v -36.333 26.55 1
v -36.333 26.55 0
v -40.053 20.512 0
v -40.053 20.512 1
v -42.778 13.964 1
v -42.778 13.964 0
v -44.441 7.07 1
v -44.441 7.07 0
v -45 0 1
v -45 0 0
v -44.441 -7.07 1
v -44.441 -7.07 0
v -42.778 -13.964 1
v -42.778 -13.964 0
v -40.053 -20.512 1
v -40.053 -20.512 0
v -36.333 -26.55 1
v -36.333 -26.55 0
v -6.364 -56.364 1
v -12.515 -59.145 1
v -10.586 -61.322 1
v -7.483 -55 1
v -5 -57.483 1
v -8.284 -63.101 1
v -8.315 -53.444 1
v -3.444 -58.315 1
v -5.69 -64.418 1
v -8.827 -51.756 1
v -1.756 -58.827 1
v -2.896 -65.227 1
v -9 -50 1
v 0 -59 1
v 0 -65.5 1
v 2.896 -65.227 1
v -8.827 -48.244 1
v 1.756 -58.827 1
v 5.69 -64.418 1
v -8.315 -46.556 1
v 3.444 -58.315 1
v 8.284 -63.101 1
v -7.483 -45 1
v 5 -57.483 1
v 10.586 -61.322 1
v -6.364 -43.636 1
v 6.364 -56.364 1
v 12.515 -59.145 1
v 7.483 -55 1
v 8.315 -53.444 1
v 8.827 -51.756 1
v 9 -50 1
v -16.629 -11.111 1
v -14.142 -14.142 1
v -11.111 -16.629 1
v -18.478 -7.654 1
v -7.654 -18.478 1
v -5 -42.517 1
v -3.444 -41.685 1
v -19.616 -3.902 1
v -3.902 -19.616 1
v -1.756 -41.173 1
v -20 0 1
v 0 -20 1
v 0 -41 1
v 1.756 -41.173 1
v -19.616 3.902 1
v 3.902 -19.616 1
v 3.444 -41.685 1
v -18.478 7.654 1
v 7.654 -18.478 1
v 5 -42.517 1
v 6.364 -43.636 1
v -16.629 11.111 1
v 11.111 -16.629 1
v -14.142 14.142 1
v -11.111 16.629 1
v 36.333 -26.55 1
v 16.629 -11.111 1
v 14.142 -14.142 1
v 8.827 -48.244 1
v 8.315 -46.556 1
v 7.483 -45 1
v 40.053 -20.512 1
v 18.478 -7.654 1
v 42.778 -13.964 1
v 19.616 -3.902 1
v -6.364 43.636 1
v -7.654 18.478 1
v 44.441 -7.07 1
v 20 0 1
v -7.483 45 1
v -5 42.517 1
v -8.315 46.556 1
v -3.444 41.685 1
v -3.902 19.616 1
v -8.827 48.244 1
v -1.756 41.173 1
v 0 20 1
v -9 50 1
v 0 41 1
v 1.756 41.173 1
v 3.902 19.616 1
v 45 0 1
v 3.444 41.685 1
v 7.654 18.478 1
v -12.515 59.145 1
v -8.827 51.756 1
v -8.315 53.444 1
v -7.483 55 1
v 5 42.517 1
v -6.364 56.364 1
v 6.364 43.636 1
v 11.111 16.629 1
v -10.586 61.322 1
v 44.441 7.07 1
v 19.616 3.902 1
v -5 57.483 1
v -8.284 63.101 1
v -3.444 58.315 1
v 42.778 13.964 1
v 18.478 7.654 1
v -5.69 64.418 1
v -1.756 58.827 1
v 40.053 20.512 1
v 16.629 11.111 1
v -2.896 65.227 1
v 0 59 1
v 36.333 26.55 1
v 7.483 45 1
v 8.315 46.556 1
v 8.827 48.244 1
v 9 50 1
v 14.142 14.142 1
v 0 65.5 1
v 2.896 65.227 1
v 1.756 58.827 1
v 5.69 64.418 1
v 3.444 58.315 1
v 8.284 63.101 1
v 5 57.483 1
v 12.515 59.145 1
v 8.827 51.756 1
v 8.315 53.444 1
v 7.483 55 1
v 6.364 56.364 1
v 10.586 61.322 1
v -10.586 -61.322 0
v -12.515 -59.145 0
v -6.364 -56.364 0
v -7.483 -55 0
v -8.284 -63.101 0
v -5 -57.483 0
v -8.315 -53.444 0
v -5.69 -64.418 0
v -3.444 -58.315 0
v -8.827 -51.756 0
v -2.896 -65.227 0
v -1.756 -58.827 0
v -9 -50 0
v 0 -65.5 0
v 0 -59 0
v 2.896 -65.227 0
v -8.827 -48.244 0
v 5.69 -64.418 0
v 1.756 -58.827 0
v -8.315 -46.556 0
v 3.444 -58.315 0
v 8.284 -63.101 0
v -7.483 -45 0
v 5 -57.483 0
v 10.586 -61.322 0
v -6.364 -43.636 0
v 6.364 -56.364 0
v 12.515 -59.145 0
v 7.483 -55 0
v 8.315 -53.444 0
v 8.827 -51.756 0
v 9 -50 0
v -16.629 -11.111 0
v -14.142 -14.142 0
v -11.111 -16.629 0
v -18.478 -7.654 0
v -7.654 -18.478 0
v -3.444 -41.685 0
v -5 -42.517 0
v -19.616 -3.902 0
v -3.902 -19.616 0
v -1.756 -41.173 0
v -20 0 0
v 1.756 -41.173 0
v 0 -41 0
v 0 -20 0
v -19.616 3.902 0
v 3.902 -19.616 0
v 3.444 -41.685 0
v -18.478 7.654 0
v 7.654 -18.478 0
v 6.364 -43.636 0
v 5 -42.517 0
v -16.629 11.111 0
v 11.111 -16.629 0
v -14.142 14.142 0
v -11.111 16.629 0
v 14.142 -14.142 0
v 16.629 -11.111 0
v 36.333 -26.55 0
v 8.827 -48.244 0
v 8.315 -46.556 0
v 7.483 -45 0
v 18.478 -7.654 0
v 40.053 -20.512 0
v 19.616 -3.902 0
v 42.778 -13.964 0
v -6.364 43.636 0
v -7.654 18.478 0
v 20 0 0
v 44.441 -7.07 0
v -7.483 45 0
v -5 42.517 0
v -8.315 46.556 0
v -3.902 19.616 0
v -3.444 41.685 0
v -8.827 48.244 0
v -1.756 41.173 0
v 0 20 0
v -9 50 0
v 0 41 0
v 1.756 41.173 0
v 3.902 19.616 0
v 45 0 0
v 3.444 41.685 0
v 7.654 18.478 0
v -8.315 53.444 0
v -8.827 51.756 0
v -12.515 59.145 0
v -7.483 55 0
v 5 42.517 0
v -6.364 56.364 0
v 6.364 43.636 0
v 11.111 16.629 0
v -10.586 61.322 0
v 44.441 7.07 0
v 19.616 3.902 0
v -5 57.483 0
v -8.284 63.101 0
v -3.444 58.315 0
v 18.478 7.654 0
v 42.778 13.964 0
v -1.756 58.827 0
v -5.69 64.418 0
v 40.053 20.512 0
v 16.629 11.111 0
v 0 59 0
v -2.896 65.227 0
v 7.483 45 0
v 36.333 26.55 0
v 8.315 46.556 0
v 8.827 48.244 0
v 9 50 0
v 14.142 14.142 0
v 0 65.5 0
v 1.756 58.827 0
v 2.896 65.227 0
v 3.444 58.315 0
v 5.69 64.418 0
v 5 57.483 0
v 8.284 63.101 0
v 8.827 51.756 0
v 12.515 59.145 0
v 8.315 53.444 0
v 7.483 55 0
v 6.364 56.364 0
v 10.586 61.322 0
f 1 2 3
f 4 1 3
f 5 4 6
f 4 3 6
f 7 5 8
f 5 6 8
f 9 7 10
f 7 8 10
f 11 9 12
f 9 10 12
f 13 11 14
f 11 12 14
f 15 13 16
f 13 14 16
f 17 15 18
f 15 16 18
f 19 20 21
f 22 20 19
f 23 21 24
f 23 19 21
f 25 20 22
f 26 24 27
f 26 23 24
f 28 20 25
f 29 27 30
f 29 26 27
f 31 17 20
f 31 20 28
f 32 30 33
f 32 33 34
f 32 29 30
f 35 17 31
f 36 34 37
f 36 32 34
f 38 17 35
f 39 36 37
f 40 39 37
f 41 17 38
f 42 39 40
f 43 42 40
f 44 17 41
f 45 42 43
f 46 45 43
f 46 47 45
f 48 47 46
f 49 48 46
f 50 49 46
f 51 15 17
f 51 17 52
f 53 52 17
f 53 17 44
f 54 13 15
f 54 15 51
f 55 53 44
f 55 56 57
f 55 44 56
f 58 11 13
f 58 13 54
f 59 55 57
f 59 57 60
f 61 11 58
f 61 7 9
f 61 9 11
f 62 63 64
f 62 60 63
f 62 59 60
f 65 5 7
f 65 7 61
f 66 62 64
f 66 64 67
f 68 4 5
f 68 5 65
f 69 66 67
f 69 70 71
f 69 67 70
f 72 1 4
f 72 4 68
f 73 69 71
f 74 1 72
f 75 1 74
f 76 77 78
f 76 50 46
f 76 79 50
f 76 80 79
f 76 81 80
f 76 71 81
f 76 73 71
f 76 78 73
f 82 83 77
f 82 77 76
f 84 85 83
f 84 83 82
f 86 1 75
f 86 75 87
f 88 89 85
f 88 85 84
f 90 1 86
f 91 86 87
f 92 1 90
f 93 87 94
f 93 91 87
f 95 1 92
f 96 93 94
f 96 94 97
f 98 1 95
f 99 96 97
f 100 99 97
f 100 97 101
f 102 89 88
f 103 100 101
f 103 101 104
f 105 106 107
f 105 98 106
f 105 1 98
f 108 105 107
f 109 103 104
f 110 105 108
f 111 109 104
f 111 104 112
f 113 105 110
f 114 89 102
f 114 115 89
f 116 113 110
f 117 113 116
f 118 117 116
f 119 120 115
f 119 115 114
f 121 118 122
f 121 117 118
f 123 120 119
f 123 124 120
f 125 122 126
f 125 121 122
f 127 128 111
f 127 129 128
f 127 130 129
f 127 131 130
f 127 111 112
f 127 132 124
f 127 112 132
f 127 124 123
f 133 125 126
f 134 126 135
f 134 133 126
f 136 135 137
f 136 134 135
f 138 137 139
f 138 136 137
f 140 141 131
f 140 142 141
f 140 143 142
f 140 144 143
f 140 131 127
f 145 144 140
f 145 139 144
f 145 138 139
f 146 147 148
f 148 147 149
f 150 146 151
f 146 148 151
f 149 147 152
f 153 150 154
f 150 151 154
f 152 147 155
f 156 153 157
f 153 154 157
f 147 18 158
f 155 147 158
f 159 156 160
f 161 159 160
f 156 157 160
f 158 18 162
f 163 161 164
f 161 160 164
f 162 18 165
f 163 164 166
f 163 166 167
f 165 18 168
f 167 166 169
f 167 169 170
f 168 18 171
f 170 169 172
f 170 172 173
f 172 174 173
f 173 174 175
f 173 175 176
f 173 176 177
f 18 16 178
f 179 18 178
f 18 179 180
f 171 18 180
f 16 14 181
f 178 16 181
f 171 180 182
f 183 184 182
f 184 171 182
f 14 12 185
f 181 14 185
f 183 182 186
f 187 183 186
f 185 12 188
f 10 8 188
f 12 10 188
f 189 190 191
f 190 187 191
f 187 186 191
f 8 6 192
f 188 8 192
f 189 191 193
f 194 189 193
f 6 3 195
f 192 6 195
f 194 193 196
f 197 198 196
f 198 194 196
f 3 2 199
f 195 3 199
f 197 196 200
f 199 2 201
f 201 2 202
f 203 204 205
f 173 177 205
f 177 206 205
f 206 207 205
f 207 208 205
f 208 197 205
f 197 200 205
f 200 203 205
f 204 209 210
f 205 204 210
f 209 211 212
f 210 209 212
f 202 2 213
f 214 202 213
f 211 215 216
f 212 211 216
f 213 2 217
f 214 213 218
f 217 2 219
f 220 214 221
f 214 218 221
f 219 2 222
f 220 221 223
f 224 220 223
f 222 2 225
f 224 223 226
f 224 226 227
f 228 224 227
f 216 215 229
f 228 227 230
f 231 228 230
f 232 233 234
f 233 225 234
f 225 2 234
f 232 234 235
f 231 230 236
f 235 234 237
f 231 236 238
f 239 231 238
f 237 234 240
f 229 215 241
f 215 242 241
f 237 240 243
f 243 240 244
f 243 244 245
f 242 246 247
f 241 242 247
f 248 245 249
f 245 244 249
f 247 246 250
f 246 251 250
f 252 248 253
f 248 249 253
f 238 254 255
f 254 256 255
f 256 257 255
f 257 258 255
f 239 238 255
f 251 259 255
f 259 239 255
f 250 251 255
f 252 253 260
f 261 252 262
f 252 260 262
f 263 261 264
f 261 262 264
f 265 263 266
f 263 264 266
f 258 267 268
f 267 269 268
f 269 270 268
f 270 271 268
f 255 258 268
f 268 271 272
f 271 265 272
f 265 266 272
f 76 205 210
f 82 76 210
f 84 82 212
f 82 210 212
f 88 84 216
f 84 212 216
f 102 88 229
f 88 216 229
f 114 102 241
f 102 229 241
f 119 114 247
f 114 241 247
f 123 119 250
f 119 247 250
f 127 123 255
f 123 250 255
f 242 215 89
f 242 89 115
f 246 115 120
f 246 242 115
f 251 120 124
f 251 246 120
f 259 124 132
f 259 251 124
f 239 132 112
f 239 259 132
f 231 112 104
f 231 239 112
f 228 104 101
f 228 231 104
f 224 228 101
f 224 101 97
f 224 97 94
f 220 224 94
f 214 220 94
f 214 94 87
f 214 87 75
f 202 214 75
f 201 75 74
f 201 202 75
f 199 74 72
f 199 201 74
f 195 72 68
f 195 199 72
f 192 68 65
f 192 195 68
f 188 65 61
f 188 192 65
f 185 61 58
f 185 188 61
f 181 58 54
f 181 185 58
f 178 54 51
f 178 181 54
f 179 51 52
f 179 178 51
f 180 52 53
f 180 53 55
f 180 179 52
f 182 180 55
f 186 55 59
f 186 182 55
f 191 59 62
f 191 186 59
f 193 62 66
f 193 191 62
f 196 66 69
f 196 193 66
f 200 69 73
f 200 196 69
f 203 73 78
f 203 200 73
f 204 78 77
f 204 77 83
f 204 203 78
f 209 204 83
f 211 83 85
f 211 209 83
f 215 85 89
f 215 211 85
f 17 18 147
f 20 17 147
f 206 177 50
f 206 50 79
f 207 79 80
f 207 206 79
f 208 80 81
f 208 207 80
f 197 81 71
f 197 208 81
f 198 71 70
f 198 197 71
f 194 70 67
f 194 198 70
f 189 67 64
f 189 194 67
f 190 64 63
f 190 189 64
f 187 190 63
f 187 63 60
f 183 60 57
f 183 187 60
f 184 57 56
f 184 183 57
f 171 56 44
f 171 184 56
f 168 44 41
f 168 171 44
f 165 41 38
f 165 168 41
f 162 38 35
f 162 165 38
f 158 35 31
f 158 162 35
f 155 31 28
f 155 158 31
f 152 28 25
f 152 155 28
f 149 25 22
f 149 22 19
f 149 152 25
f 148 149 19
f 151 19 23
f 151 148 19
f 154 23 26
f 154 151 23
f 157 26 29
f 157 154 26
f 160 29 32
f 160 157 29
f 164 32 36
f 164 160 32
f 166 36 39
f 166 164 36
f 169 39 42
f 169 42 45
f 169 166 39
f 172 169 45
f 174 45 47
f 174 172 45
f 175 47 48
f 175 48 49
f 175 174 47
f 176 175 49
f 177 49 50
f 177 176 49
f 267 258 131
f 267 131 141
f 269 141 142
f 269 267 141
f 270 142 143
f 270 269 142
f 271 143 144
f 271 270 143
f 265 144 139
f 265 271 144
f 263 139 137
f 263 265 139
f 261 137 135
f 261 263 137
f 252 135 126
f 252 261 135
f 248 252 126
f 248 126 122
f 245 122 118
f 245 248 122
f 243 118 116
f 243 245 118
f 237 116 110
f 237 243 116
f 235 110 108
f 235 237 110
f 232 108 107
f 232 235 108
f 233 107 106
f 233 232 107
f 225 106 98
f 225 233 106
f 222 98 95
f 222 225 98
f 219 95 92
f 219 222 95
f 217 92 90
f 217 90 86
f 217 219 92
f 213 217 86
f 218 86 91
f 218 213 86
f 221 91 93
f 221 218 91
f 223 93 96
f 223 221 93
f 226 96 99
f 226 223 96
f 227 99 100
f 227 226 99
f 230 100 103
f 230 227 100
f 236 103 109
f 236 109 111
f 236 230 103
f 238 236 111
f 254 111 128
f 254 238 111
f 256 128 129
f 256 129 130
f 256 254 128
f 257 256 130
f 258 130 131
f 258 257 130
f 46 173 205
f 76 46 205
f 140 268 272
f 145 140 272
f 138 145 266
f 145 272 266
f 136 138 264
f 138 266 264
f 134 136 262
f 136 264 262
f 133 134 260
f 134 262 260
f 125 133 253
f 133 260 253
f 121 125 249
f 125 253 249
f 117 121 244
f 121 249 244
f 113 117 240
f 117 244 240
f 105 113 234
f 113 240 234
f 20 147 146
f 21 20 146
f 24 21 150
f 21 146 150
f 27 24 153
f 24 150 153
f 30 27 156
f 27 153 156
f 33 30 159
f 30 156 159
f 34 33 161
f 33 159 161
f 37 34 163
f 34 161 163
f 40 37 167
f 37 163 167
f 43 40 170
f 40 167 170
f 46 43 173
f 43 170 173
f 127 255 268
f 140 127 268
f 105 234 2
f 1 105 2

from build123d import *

# Parameters (mm, degrees)
SKETCH1_R      = 20
SKETCH1_R_2    = 9
EXTRUDE1_DEPTH = 1


with BuildPart() as part:
    # Sketch1 → Extrude1 (new body)
    with BuildSketch(Plane.XY):
        with BuildLine():
            Line((-12.514750297, 59.145), (-36.333146024, 26.55))
            ThreePointArc((-36.333146024, 26.55), (-45, 0), (-36.333146024, -26.55))
            Line((-36.333146024, -26.55), (-12.514750297, -59.145))
            ThreePointArc((-12.514750297, -59.145), (0, -65.5), (12.514750297, -59.145))
            Line((12.514750297, -59.145), (36.333146024, -26.55))
            ThreePointArc((36.333146024, -26.55), (45, 0), (36.333146024, 26.55))
            Line((36.333146024, 26.55), (12.514750297, 59.145))
            ThreePointArc((12.514750297, 59.145), (0, 65.5), (-12.514750297, 59.145))
        make_face()
        Circle(SKETCH1_R, mode=Mode.SUBTRACT)
        with Locations((0, -50)):
            Circle(SKETCH1_R_2, mode=Mode.SUBTRACT)
        with Locations((0, 50)):
            Circle(SKETCH1_R_2, mode=Mode.SUBTRACT)
    extrude(amount=EXTRUDE1_DEPTH)


solid = part.part
